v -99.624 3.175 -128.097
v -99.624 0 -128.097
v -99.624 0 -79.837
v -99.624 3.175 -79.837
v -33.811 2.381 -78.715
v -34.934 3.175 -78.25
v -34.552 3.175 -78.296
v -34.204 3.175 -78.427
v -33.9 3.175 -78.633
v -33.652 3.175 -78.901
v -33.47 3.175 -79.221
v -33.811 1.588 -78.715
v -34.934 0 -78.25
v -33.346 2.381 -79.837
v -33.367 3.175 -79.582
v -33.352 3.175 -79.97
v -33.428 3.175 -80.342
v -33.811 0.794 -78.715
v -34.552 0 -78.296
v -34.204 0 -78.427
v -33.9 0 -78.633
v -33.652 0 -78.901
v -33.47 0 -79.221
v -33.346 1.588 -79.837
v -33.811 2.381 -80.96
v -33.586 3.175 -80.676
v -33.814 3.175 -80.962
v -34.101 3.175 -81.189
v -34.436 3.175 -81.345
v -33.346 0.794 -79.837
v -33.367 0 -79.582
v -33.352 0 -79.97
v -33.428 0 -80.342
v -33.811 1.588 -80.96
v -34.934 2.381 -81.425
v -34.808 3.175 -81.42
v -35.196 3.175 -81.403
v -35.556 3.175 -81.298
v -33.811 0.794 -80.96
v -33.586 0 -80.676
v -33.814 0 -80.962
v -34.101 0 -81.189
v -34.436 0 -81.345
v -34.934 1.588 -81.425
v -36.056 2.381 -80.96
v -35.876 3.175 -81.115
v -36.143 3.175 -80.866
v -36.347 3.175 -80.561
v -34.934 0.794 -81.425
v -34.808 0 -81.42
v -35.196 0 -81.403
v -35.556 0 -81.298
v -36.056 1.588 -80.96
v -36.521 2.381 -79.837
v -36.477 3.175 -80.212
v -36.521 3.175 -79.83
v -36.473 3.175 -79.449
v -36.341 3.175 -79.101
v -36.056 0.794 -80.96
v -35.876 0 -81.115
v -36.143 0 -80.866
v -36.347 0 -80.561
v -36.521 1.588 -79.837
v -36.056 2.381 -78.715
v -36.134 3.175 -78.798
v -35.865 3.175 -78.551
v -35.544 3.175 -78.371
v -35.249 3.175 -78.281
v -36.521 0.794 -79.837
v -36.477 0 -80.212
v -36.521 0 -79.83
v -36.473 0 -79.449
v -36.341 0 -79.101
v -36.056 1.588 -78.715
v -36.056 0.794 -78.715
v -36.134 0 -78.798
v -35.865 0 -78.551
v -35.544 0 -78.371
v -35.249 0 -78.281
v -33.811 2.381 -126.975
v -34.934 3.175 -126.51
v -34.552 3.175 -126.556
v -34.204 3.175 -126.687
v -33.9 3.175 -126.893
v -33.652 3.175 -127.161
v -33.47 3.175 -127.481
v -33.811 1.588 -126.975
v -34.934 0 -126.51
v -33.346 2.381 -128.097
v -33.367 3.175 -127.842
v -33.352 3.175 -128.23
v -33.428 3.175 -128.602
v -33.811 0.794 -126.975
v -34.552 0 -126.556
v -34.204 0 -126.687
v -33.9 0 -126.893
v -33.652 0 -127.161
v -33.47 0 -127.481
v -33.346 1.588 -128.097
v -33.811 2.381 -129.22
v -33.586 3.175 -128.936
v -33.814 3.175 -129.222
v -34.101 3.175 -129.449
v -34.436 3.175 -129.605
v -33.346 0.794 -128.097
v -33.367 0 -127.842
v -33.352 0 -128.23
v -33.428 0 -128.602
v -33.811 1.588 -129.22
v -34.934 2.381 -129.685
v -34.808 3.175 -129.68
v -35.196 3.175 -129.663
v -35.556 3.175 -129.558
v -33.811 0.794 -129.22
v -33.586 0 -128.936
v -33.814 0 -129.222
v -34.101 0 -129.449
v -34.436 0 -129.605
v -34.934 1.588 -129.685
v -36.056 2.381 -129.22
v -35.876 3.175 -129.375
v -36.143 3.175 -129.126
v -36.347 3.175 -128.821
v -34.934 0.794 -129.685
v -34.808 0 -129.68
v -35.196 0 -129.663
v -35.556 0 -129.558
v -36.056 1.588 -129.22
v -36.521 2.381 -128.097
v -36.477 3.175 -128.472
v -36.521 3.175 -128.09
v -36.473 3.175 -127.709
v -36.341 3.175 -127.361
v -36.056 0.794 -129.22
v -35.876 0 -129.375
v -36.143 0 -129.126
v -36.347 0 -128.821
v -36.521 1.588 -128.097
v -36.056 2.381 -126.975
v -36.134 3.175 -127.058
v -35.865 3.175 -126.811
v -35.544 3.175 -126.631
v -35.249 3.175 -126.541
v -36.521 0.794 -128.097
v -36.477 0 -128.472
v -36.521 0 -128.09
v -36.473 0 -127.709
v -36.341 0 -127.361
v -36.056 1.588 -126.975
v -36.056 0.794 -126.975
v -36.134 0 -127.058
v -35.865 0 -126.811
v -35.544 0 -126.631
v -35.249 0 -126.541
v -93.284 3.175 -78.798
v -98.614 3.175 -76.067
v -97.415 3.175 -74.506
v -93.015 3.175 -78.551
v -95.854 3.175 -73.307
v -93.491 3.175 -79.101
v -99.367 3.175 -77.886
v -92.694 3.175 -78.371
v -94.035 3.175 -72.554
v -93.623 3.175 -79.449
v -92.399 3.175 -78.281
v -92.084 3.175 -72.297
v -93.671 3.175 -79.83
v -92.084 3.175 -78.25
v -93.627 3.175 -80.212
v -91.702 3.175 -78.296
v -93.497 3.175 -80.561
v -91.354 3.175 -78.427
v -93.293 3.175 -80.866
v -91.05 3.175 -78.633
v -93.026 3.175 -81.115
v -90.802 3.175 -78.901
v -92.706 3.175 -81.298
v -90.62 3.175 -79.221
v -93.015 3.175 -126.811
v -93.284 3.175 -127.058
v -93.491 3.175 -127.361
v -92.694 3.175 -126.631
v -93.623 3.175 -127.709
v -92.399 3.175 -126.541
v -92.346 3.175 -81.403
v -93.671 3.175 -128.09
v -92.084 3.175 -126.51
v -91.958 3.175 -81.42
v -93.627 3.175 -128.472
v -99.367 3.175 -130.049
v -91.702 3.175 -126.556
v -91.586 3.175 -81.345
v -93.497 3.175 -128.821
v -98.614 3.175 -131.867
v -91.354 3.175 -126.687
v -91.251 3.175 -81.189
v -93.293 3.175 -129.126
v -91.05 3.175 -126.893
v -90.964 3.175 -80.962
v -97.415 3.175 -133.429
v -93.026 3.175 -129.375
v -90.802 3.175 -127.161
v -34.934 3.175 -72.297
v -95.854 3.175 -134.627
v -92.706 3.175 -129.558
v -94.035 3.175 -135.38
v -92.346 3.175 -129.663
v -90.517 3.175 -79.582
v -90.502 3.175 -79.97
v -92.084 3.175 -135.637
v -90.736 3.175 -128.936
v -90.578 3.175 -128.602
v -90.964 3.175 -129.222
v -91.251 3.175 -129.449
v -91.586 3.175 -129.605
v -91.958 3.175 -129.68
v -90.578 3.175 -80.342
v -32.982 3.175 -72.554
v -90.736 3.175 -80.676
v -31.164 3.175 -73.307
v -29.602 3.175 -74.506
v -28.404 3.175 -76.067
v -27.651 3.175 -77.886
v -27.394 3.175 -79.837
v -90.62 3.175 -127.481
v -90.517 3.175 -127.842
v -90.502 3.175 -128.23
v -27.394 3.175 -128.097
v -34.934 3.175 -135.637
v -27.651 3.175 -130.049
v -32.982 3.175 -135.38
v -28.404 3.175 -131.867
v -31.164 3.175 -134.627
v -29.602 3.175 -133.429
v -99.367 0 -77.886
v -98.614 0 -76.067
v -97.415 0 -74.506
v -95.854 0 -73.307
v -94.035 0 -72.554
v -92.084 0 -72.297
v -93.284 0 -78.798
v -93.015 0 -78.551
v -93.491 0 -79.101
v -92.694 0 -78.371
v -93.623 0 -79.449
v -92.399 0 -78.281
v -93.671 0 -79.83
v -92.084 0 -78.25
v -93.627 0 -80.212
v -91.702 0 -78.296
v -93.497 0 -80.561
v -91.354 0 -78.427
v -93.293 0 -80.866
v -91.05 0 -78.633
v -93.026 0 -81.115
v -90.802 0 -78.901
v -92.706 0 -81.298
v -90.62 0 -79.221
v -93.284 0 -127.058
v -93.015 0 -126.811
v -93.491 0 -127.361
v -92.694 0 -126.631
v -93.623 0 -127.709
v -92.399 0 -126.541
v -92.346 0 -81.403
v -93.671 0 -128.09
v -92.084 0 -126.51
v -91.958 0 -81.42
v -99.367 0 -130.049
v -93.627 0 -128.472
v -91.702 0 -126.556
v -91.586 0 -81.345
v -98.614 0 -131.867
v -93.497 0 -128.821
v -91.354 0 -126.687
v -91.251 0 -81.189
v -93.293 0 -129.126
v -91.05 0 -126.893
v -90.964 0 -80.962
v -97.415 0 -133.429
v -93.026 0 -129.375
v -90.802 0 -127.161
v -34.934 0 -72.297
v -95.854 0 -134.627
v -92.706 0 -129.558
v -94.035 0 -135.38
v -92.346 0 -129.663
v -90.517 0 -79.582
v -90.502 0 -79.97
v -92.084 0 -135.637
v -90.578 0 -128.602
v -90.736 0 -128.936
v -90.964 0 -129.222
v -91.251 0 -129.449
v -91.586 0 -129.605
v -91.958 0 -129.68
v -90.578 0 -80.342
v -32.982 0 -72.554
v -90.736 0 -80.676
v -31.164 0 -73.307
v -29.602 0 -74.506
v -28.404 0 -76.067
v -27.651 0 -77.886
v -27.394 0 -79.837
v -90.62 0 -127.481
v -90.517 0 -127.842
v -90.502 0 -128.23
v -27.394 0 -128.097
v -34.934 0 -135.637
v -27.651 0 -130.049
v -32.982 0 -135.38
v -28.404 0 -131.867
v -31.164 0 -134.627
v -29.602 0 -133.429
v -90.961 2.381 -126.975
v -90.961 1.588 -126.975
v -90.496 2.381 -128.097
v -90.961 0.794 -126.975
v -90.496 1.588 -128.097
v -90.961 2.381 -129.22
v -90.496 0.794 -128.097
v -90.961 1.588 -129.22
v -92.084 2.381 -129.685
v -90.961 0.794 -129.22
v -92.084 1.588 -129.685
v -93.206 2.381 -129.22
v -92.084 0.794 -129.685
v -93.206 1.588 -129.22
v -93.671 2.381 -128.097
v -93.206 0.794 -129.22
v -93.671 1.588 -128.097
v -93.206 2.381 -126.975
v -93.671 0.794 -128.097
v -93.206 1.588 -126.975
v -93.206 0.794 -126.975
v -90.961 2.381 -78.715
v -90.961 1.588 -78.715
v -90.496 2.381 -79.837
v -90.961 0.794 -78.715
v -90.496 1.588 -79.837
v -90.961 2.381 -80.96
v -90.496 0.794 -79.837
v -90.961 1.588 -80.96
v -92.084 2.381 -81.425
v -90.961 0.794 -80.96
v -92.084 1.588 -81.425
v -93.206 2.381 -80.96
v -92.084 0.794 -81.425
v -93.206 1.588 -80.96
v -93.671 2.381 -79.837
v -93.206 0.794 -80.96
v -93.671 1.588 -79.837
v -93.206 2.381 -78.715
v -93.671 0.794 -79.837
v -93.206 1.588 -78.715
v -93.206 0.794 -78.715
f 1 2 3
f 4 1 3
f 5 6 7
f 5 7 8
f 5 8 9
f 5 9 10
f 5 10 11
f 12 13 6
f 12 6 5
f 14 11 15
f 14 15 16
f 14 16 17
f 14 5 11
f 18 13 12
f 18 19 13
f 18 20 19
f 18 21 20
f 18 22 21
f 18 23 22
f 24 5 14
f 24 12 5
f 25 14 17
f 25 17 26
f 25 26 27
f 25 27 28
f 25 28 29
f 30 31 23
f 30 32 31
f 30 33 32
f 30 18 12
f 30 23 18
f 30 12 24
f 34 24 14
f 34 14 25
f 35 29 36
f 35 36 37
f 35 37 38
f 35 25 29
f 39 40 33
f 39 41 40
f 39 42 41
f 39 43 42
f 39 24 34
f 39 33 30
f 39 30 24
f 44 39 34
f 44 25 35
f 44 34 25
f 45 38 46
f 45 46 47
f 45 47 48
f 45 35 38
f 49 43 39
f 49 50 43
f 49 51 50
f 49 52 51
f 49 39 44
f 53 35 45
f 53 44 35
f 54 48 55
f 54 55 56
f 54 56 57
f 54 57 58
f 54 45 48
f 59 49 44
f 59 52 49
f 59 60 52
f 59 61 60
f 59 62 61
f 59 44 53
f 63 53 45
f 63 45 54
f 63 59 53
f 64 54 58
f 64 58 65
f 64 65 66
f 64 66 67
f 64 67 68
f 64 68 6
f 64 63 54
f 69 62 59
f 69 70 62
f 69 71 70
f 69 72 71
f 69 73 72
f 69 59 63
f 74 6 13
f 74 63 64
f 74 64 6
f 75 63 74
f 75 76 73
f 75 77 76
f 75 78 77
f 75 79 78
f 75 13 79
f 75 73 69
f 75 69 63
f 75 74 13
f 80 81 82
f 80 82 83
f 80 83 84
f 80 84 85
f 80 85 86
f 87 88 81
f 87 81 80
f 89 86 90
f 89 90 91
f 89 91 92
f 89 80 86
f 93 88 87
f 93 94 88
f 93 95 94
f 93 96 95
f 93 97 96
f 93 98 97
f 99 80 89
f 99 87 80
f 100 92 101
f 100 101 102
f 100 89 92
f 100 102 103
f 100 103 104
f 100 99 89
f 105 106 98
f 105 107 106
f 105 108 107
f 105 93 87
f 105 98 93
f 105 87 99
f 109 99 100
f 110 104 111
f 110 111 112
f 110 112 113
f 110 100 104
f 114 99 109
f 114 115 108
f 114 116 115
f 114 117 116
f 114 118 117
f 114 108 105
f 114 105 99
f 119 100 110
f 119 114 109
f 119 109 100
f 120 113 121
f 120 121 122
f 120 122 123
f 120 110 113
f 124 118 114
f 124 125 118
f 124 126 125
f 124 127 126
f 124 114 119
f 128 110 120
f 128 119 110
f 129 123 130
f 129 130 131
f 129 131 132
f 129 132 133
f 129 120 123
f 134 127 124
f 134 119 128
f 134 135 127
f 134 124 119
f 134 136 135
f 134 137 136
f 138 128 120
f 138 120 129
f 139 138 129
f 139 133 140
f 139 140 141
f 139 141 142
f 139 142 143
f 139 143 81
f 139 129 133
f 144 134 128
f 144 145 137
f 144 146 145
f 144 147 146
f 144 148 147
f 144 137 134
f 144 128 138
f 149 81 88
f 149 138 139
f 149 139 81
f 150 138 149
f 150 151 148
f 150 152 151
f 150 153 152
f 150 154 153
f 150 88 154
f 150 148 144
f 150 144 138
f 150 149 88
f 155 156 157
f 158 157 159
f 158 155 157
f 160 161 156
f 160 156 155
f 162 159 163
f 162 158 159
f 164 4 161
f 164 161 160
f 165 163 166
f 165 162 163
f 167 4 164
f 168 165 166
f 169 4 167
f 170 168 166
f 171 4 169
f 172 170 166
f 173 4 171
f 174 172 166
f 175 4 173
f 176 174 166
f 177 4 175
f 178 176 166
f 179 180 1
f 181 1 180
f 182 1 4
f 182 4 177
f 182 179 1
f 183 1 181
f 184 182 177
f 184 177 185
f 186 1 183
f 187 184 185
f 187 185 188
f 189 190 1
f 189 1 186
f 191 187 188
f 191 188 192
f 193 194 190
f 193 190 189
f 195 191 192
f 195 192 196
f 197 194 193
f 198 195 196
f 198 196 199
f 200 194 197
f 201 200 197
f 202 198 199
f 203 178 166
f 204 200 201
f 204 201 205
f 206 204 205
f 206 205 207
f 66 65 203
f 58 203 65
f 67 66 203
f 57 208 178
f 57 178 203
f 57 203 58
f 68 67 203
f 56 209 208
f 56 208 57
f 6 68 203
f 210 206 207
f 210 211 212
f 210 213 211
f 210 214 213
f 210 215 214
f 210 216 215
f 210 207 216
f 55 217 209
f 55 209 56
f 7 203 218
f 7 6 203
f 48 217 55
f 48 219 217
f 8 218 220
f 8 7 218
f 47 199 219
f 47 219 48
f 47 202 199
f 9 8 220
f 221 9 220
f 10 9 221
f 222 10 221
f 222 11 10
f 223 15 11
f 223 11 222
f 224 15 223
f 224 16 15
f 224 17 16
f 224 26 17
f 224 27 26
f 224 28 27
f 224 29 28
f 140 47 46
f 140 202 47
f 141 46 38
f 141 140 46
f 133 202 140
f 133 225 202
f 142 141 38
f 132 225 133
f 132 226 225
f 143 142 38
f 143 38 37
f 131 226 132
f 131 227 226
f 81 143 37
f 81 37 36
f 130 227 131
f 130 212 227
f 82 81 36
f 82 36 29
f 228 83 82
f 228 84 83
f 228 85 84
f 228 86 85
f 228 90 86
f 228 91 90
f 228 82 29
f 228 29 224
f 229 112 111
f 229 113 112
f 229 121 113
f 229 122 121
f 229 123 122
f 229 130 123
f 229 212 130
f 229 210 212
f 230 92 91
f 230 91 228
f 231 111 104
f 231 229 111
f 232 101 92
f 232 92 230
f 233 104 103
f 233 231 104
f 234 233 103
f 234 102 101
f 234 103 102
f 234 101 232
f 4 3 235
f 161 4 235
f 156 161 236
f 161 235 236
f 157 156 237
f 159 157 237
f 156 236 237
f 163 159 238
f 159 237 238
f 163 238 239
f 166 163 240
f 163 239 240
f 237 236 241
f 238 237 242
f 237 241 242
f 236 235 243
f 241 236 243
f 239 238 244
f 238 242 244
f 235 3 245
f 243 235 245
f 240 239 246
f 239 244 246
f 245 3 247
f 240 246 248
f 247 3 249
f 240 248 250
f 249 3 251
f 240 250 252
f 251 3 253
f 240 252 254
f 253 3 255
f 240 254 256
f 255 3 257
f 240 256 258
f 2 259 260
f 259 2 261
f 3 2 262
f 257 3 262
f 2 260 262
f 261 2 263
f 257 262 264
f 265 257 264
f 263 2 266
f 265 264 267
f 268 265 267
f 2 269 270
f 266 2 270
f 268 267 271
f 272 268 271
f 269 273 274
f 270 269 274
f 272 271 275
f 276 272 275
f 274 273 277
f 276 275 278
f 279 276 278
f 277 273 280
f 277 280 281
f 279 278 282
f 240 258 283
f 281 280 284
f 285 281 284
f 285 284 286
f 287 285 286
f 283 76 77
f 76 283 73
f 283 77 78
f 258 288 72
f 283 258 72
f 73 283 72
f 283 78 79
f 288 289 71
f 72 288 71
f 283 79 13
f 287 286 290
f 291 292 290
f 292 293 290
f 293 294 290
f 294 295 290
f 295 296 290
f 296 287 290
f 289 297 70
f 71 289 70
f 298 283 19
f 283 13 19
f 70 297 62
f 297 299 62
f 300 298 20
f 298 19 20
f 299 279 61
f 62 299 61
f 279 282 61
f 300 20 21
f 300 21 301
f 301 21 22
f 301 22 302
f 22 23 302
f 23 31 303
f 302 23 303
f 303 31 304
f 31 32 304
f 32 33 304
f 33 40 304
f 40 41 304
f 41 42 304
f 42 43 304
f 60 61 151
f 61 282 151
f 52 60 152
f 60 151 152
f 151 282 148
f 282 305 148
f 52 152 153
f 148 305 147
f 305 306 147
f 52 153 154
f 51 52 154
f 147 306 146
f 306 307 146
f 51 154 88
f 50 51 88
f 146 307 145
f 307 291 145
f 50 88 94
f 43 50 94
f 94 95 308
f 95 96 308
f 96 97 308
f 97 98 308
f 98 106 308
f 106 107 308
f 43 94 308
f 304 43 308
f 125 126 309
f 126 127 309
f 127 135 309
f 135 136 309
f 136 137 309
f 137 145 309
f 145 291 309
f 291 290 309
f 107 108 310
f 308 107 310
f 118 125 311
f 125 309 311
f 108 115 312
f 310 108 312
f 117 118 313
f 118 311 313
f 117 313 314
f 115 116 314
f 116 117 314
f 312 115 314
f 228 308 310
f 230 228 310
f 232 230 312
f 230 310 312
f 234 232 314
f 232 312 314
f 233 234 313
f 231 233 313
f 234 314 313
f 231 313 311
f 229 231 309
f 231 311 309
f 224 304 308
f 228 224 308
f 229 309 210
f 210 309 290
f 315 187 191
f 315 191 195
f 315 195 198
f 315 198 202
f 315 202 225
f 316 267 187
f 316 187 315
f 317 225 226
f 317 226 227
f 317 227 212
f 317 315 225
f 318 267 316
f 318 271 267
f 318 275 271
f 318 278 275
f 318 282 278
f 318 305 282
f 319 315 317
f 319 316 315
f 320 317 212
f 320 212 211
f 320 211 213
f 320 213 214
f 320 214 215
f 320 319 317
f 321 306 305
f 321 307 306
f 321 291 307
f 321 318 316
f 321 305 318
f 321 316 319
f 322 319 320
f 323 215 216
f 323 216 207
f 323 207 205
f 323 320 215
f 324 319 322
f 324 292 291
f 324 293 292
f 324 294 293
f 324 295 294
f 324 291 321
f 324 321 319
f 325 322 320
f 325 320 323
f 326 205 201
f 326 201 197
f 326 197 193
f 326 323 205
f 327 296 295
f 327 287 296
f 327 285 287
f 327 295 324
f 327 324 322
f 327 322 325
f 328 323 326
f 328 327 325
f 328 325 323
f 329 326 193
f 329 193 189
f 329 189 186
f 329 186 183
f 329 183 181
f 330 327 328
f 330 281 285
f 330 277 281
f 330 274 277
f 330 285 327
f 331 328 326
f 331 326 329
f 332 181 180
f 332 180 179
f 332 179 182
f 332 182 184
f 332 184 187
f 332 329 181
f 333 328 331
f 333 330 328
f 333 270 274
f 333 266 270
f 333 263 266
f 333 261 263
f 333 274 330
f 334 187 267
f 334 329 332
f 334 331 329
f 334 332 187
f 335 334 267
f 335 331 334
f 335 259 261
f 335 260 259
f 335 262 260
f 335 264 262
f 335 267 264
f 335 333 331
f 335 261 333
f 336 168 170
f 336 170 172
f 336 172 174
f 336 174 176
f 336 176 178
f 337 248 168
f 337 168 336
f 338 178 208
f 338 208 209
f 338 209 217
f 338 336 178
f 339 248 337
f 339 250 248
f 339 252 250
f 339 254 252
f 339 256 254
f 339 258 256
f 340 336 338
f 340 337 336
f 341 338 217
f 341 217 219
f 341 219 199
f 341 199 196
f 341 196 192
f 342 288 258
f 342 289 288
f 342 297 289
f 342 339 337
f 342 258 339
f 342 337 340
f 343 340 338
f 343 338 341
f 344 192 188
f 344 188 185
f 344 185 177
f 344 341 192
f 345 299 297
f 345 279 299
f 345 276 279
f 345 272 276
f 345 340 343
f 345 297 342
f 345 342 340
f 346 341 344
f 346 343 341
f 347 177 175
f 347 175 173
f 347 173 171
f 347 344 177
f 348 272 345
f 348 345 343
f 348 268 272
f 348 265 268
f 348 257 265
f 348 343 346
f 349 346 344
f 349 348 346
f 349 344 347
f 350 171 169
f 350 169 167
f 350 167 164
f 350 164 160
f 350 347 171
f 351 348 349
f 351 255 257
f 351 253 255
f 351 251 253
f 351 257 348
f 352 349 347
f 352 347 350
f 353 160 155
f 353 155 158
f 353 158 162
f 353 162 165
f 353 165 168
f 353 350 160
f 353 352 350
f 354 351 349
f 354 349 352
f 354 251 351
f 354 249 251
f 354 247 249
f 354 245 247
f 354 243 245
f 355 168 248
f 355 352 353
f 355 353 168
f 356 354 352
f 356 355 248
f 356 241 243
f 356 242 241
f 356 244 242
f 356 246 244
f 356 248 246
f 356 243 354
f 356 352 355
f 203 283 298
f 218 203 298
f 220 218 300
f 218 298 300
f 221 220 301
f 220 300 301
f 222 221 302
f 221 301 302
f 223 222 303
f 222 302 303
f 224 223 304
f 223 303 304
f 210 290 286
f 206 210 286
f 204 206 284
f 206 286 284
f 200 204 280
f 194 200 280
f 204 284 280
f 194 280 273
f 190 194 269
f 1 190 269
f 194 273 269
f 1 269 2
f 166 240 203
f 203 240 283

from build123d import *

# Parameters (mm, degrees)
BOSS_EXTRUDE1_DEPTH = 3.175


with BuildPart() as part:
    # Sketch1 → Boss-Extrude1 (new body)
    with BuildSketch(Plane(origin=(0, 0, 0), x_dir=(1, 0, 0), z_dir=(0, 1, 0))):
        with BuildLine():
            Line((-92.0838, 72.2973), (-34.9338, 72.2973))
            ThreePointArc((-34.9338, 72.2973), (-29.60221487, 74.50571487), (-27.3938, 79.8373))
            Line((-27.3938, 79.8373), (-27.3938, 128.0973))
            ThreePointArc((-27.3938, 128.0973), (-29.60221487, 133.42888513), (-34.9338, 135.6373))
            Line((-34.9338, 135.6373), (-92.0838, 135.6373))
            ThreePointArc((-92.0838, 135.6373), (-97.41538513, 133.42888513), (-99.6238, 128.0973))
            Line((-99.6238, 128.0973), (-99.6238, 79.8373))
            ThreePointArc((-99.6238, 79.8373), (-97.41538513, 74.50571487), (-92.0838, 72.2973))
        make_face()
        with BuildLine():
            add(Edge.make_bspline(
                [(-33.3463, 79.8373), (-33.3463, 80.7141), (-34.057, 81.4248), (-34.9338, 81.4248)],
                knots=[0, 0, 0, 0, 0.2, 0.2, 0.2, 0.2], degree=3))
            add(Edge.make_bspline(
                [(-34.9338, 81.4248), (-35.8106, 81.4248), (-36.5213, 80.7141), (-36.5213, 79.8373)],
                knots=[0.2, 0.2, 0.2, 0.2, 0.4, 0.4, 0.4, 0.4], degree=3))
            add(Edge.make_bspline(
                [(-36.5213, 79.8373), (-36.5213, 78.9605), (-35.8106, 78.2498), (-34.9338, 78.2498)],
                knots=[0.4, 0.4, 0.4, 0.4, 0.6, 0.6, 0.6, 0.6], degree=3))
            add(Edge.make_bspline(
                [(-34.9338, 78.2498), (-34.057, 78.2498), (-33.3463, 78.9605), (-33.3463, 79.8373)],
                knots=[0.6, 0.6, 0.6, 0.6, 1, 1, 1, 1], degree=3))
        make_face(mode=Mode.SUBTRACT)
        with BuildLine():
            add(Edge.make_bspline(
                [(-33.3463, 128.0973), (-33.3463, 128.9741), (-34.057, 129.6848), (-34.9338, 129.6848)],
                knots=[0, 0, 0, 0, 0.2, 0.2, 0.2, 0.2], degree=3))
            add(Edge.make_bspline(
                [(-34.9338, 129.6848), (-35.8106, 129.6848), (-36.5213, 128.9741), (-36.5213, 128.0973)],
                knots=[0.2, 0.2, 0.2, 0.2, 0.4, 0.4, 0.4, 0.4], degree=3))
            add(Edge.make_bspline(
                [(-36.5213, 128.0973), (-36.5213, 127.2205), (-35.8106, 126.5098), (-34.9338, 126.5098)],
                knots=[0.4, 0.4, 0.4, 0.4, 0.6, 0.6, 0.6, 0.6], degree=3))
            add(Edge.make_bspline(
                [(-34.9338, 126.5098), (-34.057, 126.5098), (-33.3463, 127.2205), (-33.3463, 128.0973)],
                knots=[0.6, 0.6, 0.6, 0.6, 1, 1, 1, 1], degree=3))
        make_face(mode=Mode.SUBTRACT)
        with BuildLine():
            add(Edge.make_bspline(
                [(-90.4963, 128.0973), (-90.4963, 128.9741), (-91.207, 129.6848), (-92.0838, 129.6848)],
                knots=[0, 0, 0, 0, 0.2, 0.2, 0.2, 0.2], degree=3))
            add(Edge.make_bspline(
                [(-92.0838, 129.6848), (-92.9606, 129.6848), (-93.6713, 128.9741), (-93.6713, 128.0973)],
                knots=[0.2, 0.2, 0.2, 0.2, 0.4, 0.4, 0.4, 0.4], degree=3))
            add(Edge.make_bspline(
                [(-93.6713, 128.0973), (-93.6713, 127.2205), (-92.9606, 126.5098), (-92.0838, 126.5098)],
                knots=[0.4, 0.4, 0.4, 0.4, 0.6, 0.6, 0.6, 0.6], degree=3))
            add(Edge.make_bspline(
                [(-92.0838, 126.5098), (-91.207, 126.5098), (-90.4963, 127.2205), (-90.4963, 128.0973)],
                knots=[0.6, 0.6, 0.6, 0.6, 1, 1, 1, 1], degree=3))
        make_face(mode=Mode.SUBTRACT)
        with BuildLine():
            add(Edge.make_bspline(
                [(-90.4963, 79.8373), (-90.4963, 80.7141), (-91.207, 81.4248), (-92.0838, 81.4248)],
                knots=[0, 0, 0, 0, 0.2, 0.2, 0.2, 0.2], degree=3))
            add(Edge.make_bspline(
                [(-92.0838, 81.4248), (-92.9606, 81.4248), (-93.6713, 80.7141), (-93.6713, 79.8373)],
                knots=[0.2, 0.2, 0.2, 0.2, 0.4, 0.4, 0.4, 0.4], degree=3))
            add(Edge.make_bspline(
                [(-93.6713, 79.8373), (-93.6713, 78.9605), (-92.9606, 78.2498), (-92.0838, 78.2498)],
                knots=[0.4, 0.4, 0.4, 0.4, 0.6, 0.6, 0.6, 0.6], degree=3))
            add(Edge.make_bspline(
                [(-92.0838, 78.2498), (-91.207, 78.2498), (-90.4963, 78.9605), (-90.4963, 79.8373)],
                knots=[0.6, 0.6, 0.6, 0.6, 1, 1, 1, 1], degree=3))
        make_face(mode=Mode.SUBTRACT)
    extrude(amount=BOSS_EXTRUDE1_DEPTH)


solid = part.part
